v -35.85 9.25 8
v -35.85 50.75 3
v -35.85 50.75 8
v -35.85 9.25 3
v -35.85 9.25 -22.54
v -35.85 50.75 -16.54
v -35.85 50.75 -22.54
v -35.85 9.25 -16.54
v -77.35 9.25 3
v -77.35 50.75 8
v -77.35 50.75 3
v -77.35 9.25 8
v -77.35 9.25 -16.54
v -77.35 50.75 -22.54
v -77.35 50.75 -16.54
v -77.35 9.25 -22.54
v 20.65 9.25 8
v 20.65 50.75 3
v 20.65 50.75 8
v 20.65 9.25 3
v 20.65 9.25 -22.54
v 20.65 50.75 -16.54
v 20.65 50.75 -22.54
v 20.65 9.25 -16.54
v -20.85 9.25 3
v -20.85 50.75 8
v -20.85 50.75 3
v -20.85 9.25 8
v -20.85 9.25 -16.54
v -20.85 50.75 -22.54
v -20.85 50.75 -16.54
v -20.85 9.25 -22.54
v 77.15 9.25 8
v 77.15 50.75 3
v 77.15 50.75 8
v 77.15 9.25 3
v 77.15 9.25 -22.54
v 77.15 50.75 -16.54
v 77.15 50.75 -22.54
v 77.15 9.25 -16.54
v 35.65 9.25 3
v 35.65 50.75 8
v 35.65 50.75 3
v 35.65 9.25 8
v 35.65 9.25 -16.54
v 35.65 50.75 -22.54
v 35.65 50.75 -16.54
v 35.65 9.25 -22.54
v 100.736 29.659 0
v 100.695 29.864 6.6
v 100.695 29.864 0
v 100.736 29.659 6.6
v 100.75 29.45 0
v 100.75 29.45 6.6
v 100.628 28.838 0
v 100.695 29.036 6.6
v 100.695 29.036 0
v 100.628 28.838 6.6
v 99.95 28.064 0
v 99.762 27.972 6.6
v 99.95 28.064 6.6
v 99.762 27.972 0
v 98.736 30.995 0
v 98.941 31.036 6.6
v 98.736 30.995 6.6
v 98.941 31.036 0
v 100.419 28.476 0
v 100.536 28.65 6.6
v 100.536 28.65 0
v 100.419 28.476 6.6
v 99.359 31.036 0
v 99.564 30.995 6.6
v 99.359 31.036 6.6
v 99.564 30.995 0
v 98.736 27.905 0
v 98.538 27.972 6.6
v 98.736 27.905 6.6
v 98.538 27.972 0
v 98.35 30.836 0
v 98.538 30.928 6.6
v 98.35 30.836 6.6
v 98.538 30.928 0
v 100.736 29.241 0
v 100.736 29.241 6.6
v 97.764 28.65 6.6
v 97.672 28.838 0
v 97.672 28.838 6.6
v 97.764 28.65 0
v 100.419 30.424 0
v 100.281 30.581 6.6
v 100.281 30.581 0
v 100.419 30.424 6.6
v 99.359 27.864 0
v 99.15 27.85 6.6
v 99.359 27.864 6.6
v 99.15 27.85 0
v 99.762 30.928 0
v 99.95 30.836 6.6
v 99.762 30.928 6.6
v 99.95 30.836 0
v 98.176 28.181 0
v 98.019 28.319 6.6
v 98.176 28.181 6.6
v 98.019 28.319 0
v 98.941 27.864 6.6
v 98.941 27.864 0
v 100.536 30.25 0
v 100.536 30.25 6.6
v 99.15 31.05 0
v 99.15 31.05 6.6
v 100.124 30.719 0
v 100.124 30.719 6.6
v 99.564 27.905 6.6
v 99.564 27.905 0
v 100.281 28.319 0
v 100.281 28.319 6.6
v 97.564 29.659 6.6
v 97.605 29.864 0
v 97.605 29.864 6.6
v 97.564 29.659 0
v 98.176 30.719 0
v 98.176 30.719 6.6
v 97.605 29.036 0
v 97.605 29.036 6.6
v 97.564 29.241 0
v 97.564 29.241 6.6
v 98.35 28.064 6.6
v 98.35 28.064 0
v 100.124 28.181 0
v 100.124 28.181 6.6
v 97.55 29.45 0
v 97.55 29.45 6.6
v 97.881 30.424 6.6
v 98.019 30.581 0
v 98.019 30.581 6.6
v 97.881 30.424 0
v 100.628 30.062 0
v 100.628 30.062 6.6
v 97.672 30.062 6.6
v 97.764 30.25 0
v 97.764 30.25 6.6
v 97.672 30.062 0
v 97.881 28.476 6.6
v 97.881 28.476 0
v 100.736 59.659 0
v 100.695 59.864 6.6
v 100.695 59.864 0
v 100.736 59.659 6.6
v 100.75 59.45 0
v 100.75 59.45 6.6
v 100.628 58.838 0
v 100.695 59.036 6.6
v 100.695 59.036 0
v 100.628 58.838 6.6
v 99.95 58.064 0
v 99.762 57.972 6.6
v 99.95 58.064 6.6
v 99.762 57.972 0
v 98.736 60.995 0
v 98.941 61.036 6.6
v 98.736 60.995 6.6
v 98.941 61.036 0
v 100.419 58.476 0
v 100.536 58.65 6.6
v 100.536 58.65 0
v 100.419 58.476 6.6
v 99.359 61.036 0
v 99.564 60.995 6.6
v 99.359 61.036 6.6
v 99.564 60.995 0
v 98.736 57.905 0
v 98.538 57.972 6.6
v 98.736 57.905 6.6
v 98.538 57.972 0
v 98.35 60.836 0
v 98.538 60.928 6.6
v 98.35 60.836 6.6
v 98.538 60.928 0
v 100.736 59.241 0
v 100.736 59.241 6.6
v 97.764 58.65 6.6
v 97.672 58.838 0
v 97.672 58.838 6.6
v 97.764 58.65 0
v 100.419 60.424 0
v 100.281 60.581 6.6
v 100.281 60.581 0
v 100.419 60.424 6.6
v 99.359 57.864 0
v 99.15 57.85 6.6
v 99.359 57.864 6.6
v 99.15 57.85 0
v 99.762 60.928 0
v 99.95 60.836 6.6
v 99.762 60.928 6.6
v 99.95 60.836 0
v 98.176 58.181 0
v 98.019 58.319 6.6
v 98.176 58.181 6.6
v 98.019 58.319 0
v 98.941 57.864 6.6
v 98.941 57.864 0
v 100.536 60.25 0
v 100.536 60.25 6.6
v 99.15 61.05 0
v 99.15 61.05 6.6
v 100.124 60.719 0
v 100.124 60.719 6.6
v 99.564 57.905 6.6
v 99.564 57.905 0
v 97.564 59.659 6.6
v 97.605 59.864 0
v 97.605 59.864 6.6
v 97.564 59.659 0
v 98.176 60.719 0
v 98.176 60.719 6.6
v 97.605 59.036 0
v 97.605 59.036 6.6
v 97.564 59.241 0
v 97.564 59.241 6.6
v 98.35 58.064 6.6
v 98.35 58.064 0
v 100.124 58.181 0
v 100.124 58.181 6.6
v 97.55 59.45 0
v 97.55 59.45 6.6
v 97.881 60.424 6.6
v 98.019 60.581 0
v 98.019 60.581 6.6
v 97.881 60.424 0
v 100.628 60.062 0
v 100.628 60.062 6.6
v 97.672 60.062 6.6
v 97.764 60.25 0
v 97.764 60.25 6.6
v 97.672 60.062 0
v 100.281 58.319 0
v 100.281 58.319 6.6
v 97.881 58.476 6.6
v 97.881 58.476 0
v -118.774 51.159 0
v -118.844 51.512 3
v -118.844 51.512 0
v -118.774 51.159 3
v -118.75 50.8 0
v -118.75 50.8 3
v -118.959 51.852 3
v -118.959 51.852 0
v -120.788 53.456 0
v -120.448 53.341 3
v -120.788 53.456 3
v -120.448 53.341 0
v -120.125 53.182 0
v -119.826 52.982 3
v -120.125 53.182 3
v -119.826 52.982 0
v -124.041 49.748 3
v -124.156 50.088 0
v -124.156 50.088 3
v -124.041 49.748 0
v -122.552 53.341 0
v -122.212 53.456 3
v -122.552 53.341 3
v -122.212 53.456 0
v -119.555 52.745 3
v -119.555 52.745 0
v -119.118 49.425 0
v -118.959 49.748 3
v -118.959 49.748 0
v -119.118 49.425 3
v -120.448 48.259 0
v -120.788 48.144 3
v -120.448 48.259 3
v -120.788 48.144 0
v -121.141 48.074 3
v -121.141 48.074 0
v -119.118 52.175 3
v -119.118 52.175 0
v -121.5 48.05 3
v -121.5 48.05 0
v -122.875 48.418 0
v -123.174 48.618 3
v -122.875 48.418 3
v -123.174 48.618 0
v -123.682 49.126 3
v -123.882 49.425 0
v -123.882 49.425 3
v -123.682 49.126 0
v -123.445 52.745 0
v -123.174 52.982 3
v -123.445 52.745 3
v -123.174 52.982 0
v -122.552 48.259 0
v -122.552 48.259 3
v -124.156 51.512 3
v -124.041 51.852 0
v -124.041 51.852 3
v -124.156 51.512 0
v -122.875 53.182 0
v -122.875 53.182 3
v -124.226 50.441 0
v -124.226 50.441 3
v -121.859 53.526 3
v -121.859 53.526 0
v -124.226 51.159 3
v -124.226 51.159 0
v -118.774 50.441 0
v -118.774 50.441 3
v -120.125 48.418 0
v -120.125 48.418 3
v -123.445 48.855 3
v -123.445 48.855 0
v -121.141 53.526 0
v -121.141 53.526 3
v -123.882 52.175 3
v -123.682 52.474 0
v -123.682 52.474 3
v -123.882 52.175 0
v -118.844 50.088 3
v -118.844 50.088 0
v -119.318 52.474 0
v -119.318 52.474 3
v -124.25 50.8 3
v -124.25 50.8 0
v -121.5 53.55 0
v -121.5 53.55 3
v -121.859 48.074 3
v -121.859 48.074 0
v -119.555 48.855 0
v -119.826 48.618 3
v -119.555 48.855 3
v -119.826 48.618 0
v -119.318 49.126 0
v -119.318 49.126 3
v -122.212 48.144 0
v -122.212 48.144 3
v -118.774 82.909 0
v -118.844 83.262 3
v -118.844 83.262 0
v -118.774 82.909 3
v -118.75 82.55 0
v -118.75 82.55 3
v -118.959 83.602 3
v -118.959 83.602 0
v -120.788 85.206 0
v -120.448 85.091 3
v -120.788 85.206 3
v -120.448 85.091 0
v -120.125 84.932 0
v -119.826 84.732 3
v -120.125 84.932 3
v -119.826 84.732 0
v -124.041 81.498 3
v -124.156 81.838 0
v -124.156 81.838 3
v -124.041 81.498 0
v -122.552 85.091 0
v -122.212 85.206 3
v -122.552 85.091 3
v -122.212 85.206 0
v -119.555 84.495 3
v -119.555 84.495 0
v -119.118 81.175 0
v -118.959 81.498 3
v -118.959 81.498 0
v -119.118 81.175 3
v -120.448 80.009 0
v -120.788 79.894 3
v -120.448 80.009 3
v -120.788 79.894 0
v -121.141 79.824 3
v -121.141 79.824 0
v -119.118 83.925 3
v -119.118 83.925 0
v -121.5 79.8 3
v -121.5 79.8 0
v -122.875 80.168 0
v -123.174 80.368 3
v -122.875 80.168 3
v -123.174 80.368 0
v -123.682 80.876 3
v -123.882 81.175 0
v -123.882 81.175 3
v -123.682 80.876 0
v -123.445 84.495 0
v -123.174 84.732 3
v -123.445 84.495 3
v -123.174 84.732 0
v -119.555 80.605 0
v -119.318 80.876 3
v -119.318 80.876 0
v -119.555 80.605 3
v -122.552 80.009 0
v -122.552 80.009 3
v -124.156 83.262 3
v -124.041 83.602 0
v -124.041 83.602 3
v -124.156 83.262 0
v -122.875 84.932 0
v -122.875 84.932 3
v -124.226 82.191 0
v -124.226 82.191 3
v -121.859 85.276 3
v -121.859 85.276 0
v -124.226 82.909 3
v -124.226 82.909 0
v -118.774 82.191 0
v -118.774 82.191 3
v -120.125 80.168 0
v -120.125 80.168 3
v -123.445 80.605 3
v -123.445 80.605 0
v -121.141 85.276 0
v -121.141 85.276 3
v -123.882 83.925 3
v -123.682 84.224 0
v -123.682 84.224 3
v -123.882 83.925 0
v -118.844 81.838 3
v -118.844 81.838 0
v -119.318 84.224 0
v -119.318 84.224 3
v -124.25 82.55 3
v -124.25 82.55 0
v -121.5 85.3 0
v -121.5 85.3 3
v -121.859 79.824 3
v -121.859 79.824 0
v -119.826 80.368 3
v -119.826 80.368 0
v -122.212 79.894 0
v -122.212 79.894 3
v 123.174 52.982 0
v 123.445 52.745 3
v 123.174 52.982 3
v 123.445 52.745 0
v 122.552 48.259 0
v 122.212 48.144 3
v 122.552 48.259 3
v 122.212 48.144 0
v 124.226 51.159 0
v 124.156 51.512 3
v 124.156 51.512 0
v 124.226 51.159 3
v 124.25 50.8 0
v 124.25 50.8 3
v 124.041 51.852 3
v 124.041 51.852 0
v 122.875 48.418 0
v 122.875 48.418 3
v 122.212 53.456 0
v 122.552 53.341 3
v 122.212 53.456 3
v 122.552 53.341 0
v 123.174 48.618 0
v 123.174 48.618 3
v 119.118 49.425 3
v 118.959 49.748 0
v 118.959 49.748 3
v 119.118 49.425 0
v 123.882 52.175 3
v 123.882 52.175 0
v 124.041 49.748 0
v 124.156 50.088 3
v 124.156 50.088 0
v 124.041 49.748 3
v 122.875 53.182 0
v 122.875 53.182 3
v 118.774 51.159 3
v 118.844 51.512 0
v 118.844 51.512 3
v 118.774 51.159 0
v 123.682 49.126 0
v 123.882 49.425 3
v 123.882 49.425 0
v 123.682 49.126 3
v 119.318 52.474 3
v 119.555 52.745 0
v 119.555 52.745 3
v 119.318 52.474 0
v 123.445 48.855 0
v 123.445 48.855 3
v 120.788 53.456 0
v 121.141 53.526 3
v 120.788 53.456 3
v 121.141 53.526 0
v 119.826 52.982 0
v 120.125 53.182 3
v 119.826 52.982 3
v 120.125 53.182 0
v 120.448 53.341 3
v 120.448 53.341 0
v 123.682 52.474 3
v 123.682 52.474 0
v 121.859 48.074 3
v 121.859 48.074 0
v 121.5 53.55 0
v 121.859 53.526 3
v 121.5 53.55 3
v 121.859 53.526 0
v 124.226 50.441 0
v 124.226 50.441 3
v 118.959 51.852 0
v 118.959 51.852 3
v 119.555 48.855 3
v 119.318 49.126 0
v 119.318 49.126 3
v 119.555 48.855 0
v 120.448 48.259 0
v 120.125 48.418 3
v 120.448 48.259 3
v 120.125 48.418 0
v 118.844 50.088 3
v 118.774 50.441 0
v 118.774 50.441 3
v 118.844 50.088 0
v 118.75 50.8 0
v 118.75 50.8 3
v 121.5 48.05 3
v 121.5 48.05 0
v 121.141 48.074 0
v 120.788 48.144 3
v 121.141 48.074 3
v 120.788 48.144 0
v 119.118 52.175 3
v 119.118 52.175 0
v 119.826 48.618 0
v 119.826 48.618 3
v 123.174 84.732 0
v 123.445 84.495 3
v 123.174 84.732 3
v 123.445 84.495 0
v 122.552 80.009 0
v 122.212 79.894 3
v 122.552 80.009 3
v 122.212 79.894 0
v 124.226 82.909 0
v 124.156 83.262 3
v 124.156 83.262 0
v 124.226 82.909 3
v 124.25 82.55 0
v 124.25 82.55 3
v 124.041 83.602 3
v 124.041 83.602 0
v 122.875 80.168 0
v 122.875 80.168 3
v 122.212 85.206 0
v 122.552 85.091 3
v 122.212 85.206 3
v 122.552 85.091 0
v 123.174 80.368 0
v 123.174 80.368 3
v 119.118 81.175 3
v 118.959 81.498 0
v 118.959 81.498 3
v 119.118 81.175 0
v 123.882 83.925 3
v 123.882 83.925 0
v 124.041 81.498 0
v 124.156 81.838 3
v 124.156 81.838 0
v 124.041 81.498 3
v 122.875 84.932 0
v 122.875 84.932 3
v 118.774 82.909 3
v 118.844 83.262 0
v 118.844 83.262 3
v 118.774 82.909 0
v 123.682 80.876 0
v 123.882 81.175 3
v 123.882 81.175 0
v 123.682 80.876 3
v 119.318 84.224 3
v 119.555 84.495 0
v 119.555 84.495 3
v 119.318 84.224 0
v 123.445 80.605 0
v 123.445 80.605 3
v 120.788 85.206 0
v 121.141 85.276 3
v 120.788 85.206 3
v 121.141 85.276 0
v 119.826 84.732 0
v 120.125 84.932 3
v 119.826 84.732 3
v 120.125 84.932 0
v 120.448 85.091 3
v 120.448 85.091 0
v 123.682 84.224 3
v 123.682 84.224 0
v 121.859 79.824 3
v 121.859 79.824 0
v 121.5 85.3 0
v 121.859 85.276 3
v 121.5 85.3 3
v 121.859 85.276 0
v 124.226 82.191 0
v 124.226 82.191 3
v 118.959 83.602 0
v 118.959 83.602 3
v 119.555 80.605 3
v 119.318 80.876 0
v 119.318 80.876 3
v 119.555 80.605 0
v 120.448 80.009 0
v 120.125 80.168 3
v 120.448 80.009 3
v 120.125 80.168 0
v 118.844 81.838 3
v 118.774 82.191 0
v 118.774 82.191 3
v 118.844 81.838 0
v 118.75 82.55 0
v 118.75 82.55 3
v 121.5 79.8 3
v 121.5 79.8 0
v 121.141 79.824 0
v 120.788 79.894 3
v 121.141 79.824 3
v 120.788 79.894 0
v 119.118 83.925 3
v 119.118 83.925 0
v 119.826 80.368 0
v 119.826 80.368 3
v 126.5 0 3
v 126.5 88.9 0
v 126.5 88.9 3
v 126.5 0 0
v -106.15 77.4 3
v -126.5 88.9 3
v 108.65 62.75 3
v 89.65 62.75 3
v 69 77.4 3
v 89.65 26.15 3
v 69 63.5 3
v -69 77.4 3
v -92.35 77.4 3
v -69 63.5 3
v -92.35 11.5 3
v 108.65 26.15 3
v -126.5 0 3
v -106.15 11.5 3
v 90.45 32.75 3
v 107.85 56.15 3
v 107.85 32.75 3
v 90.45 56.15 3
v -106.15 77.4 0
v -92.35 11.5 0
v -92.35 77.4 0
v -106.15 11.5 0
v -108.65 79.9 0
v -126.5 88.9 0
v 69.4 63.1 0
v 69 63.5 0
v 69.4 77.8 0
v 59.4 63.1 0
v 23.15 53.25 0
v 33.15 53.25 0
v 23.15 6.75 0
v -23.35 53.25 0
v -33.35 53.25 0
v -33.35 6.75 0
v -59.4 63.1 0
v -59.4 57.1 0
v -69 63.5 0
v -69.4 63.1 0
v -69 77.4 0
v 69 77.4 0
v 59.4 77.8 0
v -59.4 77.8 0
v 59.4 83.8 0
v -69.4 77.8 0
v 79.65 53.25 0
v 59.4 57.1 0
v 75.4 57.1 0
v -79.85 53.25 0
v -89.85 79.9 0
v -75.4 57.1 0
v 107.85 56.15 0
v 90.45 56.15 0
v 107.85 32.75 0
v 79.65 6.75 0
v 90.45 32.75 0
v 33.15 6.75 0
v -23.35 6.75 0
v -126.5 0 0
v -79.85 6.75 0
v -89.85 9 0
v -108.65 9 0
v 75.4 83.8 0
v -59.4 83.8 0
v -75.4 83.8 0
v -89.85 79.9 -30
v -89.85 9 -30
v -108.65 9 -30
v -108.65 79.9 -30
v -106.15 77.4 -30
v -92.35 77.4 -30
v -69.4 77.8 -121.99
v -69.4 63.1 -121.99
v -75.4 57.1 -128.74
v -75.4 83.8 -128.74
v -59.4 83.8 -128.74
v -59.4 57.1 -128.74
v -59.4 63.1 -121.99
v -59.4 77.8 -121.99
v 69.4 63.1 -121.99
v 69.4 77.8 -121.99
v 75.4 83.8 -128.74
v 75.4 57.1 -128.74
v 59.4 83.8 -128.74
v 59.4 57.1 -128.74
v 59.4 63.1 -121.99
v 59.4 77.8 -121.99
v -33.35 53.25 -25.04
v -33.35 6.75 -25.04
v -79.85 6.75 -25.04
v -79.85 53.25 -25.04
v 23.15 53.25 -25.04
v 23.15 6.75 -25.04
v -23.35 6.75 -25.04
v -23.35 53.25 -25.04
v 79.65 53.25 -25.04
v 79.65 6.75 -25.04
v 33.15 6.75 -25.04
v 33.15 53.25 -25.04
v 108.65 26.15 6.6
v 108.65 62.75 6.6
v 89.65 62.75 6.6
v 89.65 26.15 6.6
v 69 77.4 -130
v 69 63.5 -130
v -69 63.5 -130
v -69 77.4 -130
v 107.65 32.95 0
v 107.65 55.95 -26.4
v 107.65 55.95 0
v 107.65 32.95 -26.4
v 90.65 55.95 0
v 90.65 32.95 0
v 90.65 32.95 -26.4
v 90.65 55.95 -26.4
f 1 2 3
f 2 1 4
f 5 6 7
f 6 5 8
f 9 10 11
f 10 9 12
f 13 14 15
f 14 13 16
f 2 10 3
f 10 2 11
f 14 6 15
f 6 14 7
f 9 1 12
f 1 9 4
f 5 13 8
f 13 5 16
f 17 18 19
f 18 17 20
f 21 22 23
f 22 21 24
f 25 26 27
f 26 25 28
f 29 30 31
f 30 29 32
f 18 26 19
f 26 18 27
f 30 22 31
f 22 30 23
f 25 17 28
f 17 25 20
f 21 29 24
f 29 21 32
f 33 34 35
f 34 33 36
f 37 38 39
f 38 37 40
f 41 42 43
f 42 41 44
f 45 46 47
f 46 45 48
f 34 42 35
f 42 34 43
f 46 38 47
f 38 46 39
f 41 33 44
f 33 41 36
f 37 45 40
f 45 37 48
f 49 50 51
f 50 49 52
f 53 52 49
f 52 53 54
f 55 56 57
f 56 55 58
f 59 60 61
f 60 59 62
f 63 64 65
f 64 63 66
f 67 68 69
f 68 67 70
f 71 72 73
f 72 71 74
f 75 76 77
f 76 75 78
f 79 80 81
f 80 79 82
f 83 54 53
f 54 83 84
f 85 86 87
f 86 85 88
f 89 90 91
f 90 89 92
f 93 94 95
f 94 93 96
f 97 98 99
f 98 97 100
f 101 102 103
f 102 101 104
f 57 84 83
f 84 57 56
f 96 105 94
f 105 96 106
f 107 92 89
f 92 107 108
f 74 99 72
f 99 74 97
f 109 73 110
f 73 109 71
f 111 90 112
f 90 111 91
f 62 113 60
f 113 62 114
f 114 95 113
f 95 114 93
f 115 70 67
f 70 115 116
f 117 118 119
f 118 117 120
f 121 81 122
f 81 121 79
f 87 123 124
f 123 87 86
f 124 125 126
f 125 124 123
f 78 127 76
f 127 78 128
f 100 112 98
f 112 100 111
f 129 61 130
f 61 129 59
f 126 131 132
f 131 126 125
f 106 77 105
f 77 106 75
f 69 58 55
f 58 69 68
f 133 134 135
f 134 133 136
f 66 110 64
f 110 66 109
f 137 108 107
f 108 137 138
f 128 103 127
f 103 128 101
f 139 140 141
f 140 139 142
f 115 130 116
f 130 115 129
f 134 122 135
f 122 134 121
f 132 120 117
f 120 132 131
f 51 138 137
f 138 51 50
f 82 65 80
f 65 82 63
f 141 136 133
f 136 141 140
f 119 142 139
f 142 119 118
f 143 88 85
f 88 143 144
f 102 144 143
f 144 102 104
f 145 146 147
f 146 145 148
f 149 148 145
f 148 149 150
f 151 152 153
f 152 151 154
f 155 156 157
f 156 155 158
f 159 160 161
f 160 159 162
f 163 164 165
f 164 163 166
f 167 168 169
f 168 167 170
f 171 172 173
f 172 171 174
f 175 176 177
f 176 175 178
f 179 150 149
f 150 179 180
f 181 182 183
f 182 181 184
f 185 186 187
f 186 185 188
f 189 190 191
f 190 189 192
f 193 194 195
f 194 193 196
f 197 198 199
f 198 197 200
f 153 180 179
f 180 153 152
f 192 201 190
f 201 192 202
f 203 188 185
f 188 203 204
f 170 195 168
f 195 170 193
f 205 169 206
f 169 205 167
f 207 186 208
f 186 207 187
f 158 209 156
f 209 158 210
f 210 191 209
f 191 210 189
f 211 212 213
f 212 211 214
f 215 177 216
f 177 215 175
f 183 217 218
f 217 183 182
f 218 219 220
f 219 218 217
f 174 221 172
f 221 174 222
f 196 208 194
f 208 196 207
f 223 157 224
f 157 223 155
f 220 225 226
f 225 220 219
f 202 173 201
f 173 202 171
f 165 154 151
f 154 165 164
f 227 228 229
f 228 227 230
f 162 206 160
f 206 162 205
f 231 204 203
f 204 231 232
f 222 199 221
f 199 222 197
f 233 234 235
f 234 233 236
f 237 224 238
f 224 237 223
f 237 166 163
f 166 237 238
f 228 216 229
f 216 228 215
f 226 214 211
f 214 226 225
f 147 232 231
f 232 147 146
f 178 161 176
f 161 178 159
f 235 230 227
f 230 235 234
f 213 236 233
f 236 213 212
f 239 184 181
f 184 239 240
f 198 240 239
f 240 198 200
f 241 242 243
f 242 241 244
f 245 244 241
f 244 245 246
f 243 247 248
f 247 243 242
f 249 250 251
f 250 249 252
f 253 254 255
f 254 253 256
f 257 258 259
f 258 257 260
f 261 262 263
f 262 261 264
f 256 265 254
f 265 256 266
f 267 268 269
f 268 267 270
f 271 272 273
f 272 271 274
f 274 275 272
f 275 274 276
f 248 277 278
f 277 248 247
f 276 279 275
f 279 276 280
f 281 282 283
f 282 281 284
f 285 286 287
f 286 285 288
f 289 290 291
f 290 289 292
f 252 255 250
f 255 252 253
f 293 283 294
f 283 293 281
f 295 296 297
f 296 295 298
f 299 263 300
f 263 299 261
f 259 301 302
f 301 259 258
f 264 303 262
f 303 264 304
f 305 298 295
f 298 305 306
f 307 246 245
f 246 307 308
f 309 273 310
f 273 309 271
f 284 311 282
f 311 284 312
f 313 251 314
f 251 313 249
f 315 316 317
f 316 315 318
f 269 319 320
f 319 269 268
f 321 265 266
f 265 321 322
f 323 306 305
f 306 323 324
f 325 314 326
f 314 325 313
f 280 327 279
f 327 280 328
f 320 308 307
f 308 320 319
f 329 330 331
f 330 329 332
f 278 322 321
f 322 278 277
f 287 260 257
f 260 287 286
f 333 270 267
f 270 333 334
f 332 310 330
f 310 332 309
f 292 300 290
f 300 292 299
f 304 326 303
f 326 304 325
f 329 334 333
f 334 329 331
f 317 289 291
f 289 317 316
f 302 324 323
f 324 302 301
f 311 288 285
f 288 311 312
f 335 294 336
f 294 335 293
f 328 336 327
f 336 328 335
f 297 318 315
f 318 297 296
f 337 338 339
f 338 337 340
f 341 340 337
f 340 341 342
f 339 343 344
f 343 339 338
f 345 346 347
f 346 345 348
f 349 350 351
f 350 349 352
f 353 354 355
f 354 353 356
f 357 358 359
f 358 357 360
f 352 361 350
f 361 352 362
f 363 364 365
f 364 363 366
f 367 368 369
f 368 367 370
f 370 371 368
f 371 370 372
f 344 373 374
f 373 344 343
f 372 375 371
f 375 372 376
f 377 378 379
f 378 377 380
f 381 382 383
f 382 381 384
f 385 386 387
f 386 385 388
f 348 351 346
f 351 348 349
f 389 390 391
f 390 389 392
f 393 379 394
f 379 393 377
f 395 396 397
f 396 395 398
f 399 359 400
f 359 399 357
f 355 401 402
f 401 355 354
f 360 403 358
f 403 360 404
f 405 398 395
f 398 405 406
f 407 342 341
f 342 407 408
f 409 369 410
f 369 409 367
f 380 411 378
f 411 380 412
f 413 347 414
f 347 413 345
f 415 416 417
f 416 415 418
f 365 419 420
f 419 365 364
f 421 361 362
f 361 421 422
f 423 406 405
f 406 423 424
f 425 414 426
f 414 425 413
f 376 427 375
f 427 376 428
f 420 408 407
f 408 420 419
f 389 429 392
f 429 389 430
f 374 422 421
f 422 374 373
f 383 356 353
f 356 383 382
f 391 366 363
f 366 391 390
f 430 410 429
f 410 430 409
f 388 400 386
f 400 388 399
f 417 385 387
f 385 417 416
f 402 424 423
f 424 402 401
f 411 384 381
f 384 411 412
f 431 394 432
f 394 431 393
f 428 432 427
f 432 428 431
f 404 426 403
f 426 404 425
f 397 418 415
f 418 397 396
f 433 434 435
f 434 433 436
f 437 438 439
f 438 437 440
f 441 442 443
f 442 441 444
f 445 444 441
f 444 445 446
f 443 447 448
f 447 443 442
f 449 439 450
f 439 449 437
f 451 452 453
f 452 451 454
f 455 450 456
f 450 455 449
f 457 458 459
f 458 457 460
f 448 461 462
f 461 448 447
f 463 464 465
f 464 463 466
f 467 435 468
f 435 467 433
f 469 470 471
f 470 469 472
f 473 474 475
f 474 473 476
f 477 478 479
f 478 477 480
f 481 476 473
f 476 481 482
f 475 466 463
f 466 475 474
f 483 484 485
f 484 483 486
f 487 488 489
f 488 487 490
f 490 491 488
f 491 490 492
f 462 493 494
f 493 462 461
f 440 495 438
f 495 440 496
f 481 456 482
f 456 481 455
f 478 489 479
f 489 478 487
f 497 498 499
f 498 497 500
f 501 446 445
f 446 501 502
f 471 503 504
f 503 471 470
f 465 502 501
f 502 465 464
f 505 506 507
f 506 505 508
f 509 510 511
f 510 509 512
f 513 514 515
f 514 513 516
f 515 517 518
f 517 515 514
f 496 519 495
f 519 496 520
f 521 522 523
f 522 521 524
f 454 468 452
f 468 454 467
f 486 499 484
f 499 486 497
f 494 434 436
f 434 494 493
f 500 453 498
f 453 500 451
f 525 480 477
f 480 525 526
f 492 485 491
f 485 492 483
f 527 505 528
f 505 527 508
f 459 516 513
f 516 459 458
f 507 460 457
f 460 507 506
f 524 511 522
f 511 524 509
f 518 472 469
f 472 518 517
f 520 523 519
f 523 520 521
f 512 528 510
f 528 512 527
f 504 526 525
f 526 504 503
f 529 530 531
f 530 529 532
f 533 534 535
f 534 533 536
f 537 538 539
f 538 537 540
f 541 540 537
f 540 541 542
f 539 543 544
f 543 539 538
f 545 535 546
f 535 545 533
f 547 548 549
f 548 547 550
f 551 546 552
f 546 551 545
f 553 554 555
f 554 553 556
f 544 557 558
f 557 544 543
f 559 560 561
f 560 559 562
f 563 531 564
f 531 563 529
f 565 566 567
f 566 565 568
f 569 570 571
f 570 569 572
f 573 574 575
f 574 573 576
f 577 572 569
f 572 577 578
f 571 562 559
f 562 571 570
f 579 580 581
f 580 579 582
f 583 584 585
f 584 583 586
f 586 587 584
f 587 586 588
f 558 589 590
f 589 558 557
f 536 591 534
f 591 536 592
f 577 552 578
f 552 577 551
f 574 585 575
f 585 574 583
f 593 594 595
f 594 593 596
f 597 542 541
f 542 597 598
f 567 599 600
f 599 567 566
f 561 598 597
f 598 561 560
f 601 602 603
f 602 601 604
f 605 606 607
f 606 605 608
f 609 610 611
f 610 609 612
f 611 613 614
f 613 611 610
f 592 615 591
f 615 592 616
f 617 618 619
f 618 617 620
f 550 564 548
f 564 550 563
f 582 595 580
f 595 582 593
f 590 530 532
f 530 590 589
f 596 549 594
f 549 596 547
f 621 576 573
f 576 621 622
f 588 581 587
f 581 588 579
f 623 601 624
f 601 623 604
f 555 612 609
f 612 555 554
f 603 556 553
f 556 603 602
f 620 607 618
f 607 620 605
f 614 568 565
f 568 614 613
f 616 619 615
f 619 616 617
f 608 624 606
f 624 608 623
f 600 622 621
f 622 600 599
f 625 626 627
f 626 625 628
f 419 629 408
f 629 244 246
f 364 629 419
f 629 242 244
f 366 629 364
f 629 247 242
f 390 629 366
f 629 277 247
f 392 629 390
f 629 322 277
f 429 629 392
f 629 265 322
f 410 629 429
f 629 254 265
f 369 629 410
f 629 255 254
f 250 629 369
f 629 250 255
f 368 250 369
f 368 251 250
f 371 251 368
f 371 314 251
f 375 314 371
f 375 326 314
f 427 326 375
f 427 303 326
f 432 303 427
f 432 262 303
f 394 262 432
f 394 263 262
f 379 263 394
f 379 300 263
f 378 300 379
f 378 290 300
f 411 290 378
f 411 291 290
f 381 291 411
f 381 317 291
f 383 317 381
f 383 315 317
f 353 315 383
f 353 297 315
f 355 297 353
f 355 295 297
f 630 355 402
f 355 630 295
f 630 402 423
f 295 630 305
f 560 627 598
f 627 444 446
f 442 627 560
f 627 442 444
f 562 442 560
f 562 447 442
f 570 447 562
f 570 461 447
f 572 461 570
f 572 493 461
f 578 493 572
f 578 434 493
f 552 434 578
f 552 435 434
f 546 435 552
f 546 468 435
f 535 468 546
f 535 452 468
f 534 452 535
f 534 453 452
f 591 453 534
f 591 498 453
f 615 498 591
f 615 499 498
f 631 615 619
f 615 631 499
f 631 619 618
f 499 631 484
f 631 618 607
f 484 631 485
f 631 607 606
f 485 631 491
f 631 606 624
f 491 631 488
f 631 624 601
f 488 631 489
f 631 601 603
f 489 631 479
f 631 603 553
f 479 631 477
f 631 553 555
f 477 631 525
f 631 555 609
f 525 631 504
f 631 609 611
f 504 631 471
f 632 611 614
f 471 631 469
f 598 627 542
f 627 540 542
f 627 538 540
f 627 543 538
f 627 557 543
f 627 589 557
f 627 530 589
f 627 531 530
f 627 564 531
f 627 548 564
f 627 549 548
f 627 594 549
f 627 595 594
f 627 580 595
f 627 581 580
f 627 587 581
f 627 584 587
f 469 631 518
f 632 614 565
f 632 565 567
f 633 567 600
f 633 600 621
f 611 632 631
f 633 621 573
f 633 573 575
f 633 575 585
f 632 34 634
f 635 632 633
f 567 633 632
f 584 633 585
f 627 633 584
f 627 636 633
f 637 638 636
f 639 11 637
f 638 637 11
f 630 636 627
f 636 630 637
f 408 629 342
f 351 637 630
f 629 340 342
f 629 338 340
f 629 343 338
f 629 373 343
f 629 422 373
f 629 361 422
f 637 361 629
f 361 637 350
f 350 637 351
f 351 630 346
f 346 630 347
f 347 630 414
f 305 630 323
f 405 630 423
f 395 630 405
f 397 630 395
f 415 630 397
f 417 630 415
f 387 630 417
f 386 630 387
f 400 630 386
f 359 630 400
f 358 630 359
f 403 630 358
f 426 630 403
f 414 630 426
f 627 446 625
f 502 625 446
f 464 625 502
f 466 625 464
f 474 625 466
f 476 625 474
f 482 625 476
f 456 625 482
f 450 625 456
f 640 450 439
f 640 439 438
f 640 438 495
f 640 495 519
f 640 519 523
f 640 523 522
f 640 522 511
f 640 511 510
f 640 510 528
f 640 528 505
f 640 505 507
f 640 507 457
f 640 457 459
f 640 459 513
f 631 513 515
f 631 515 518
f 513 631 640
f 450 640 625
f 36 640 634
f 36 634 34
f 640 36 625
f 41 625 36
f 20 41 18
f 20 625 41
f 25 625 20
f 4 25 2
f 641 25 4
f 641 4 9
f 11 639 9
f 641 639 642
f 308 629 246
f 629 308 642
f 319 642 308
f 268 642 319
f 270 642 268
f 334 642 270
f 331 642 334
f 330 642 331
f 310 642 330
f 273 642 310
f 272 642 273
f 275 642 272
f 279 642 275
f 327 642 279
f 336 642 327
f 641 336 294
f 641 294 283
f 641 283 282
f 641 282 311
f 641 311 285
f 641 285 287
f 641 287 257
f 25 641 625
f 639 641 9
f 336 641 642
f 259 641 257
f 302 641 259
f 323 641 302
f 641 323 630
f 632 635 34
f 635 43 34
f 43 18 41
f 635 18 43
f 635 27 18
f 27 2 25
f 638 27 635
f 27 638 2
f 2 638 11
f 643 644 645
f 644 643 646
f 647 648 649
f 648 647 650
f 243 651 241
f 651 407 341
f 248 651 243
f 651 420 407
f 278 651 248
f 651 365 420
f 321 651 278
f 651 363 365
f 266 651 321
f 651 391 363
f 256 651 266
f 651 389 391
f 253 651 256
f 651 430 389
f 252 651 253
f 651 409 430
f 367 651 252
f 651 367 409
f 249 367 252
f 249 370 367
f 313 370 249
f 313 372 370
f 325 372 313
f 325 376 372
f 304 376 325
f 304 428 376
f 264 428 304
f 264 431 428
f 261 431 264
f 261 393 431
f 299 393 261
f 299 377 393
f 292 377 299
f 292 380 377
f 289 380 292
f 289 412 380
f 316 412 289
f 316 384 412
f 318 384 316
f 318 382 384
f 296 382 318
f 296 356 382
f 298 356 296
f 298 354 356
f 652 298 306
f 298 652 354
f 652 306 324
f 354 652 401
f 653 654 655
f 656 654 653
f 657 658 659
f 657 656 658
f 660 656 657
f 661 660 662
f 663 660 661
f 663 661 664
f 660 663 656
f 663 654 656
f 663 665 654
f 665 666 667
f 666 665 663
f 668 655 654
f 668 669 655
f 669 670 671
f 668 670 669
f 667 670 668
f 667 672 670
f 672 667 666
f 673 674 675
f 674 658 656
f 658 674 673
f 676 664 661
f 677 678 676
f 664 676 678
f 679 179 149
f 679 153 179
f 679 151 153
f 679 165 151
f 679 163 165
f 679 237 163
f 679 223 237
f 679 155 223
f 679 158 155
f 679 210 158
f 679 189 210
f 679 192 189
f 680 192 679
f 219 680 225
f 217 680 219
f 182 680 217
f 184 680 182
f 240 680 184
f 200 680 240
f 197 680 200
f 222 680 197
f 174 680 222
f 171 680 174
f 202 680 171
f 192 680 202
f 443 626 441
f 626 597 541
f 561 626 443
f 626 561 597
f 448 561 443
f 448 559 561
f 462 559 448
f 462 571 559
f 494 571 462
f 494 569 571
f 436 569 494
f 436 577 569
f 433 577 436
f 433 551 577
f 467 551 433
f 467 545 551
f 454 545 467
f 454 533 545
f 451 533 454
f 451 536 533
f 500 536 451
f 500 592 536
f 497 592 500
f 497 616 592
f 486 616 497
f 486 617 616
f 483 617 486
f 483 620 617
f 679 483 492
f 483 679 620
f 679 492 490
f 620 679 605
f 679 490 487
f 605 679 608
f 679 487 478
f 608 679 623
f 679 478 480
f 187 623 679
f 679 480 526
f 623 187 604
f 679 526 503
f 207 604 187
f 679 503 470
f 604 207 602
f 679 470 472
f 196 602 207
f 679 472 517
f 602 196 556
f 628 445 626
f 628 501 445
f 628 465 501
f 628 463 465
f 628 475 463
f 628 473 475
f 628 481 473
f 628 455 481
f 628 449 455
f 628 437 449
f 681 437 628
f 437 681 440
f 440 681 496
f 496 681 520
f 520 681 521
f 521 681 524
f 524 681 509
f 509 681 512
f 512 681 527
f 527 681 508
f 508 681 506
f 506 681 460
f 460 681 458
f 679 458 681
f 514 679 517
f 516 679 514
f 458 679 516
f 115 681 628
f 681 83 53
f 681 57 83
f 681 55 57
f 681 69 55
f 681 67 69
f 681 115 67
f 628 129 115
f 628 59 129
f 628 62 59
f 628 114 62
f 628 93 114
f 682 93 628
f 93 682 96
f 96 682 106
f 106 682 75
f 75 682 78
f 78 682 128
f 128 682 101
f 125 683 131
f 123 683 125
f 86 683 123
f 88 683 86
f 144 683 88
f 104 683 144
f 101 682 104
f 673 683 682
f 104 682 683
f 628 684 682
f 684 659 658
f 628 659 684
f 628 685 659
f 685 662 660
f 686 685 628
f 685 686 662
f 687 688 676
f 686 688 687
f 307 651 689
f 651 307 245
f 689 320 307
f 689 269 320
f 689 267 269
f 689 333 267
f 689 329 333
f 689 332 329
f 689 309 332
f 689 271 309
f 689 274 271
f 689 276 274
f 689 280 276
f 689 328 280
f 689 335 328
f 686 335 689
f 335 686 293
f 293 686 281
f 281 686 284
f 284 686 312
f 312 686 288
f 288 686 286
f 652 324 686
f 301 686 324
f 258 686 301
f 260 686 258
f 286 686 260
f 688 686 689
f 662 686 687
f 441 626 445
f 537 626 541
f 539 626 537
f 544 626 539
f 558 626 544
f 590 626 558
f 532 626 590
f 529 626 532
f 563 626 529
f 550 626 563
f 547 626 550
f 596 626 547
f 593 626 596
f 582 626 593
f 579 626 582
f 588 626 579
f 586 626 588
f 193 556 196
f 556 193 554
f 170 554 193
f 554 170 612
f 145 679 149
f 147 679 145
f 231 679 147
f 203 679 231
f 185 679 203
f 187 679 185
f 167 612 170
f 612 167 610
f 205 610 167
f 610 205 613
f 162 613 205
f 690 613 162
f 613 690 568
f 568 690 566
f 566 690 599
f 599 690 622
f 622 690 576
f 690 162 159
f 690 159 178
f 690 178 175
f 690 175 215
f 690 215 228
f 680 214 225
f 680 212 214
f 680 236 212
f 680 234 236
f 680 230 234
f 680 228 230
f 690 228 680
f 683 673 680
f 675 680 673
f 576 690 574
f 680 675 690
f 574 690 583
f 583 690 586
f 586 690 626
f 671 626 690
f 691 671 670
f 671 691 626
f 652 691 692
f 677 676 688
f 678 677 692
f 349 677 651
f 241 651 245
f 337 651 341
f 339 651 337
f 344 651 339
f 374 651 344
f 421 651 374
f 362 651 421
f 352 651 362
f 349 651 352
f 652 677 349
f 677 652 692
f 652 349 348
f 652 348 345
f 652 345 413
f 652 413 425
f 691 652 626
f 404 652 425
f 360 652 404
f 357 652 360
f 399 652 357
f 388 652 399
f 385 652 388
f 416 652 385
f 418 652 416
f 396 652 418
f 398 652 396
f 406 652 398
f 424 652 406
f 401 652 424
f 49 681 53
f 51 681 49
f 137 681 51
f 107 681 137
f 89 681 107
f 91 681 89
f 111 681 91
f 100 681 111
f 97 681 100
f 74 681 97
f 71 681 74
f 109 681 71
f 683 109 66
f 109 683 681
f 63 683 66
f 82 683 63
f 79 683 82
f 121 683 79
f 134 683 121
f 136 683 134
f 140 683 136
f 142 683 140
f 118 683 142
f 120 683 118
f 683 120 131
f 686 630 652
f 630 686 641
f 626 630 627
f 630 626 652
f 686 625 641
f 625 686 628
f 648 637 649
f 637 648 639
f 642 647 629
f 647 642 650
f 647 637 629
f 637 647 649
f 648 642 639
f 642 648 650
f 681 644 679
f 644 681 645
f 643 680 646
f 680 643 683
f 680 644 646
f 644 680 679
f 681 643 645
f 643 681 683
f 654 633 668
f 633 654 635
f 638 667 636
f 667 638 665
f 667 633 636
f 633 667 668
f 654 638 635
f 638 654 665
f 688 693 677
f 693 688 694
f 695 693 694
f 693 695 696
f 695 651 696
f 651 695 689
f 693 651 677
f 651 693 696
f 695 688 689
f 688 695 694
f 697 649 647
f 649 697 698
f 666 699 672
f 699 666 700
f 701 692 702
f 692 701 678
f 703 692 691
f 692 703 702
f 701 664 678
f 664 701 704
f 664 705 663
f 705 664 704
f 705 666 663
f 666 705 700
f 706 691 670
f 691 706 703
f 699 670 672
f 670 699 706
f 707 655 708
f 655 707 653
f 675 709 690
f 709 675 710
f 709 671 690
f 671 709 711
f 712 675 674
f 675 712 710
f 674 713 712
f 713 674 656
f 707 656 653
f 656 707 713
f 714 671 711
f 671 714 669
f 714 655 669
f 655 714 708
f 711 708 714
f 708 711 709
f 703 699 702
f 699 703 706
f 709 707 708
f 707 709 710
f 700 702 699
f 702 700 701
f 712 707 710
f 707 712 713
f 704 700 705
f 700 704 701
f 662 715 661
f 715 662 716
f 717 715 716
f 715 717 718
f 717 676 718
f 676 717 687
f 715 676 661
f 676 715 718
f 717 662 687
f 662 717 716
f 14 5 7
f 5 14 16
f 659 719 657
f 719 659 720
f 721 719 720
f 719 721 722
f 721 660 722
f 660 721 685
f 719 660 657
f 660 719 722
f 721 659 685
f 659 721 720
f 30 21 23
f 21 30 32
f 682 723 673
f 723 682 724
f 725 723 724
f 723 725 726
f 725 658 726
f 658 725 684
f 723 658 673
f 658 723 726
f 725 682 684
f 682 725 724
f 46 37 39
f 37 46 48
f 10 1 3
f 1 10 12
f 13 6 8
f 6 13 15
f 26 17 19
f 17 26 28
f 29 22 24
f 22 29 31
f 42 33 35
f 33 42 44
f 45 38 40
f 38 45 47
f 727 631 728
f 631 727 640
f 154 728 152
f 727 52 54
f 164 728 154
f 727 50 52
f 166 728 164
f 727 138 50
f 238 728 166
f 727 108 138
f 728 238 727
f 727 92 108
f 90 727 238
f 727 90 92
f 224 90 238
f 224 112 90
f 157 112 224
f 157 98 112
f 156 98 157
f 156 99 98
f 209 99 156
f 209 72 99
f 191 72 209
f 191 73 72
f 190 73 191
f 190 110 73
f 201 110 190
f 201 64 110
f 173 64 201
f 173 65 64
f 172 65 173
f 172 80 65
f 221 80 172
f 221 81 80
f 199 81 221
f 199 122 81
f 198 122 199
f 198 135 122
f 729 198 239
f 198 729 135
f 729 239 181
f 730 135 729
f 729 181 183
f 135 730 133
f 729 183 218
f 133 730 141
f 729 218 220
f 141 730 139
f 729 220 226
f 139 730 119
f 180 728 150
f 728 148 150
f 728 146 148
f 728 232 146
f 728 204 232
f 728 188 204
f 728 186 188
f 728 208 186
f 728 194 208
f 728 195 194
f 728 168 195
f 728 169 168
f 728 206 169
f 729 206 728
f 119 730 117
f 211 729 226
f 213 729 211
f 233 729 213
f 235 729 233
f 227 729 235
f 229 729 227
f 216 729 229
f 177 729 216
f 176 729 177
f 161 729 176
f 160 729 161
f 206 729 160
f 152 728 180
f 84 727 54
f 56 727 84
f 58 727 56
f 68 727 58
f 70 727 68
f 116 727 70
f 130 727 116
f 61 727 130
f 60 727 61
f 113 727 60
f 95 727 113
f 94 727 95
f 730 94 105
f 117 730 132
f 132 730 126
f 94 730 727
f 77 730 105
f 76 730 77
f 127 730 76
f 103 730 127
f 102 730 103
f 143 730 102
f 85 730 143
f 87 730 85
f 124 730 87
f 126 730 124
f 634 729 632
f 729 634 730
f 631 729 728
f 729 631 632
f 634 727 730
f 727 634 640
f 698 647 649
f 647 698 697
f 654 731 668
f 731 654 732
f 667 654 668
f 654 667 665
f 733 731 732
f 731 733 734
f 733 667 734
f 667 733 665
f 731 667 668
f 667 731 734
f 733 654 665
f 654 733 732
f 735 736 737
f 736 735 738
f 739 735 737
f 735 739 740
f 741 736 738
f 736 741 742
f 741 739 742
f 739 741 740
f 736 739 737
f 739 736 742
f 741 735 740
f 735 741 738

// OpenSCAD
// =============================================================================
// CONSOLE10 — Blu-ray Faceplate  v0.5  (2U TOP: CF + Blu-ray + 3 SD + USB-C)
//
// Regular 2U flat 3 mm faceplate that bolts to the cheek SLANT inserts.
// Hosts: CF reader (left), a slot-load Blu-ray drive (center, with side rails
// reaching back), the 3 SD-card holders relocated UNDER the Blu-ray slot, and a
// USB-C panel mount (right). (2026-06-02 edits.)
//
// Split off from the 3U LCD-hole faceplate on 2026-05-30. See
// `Console10_interface_specs.md` for the canonical device dimensions.
// =============================================================================

// ---------- module geometry the plate must mate to ----------
panel_width   = 253;
cheek_thick   = 10;
slant_angle   = 30;
U             = 44.45;
interior_half = panel_width/2 - cheek_thick;   // 116.5
cheek_ctr_x   = interior_half + cheek_thick/2; // 121.5

// ---------- flat plate ----------
n_u      = 2;             // 2U faceplate (top panel)
plate_w  = 253;
plate_h  = n_u * U;       // 88.9
plate_t  = 3;

// ---------- CF reader (press-fit, full-depth open sleeve) ----------
cf_w         = 13.8;
cf_h         = 65.9;
cf_d         = 30;
cf_press_clr = 0;
cf_wall_t    = 2.5;
cf_cx        = -99.25;     // shifted left so 3 holders + USB-C fit symmetrically
cf_cy        = plate_h/2;

// ---------- SD card holder (press-fit, closed-back sleeve, sits proud) ----
holder_w         = 41.5;
holder_h         = 41.5;
holder_d         = 24.54;
holder_press_clr = 0;
holder_wall_t    = 2.5;
holder_proud     = 5;
holder_sleeve_extra_d = 6;
holder_sleeve_d  = (holder_d - plate_t - holder_proud) + holder_wall_t + holder_sleeve_extra_d;

// ---------- USB-C panel mount (QIANRENON rectangular, screw-mounted, proud) ----
usbc_body_w         = 17;
usbc_body_h         = 23;
usbc_body_d         = 26.4;
usbc_flange_w       = 19;
usbc_flange_h       = 36.6;
usbc_flange_t       = 3.6;
usbc_screw_d        = 3.2;
usbc_screw_y_pitch  = 30;
usbc_body_clr       = 0.2;

// ---------- horizontal layout ----------
// Devices left-to-right: CF, holder1, holder2, holder3, USB-C. 3 holders
// grouped consecutively; USB-C anchors the far right. Each device's outer
// footprint separated from the next by panel_layout_gap. Layout symmetric
// around X=0 (cf_cx chosen to balance).
panel_layout_gap = 10;
holder_cy = 30;   // lowered UNDER the Blu-ray drive, clear of its side rails (was plate_h/2)

// Half-widths used in chain math
_cf_half     = (cf_w - 2*cf_press_clr)/2 + cf_wall_t;            //  9.4
_holder_half = (holder_w - 2*holder_press_clr)/2 + holder_wall_t; // 23.25

holder1_cx = cf_cx + _cf_half + panel_layout_gap + _holder_half;
holder2_cx = holder1_cx + 2*_holder_half + panel_layout_gap;
holder3_cx = holder2_cx + 2*_holder_half + panel_layout_gap;
usbc_cx    = holder3_cx + _holder_half + panel_layout_gap + usbc_flange_w/2;
usbc_cy    = plate_h/2;

// All holder X centers (loop over this in panel/mocks)
holder_cxs = [holder1_cx, holder2_cx, holder3_cx];

// ---------- slant-insert mount holes ----------
// 2U plate spans s=0..88.9; only the U0 cheek-rail row fits: 50.80, 66.675, 82.55.
// Use the wide pair (50.80, 82.55) = 31.75 mm vertical grip. (s=22.225 is inside
// the front gap and has NO hole.)
mount_y      = [50.80, 82.55];
m10_32_clear = 5.5;

// ---------- Blu-ray disc slot (added 2026-06-02) ----------
// Slot-loading Blu-ray drive. This opening is the disc slot; TOP edge aligned
// with the top of the CF (media) reader slot. Centered on the plate in X (no X
// spec was given).
slot_w   = 138;
slot_h   = 13.9;
slot_d   = 100;                   // also the support-rail length back behind the face
slot_cx  = 0;
slot_top = cf_cy + cf_h/2;        // top of the CF reader slot = 77.4
slot_cy  = slot_top - slot_h/2;   // 70.45

// ---------- Blu-ray support rails (added 2026-06-02) ----------
// SIDE rails that wrap the drive's LEFT & RIGHT edges — a C-channel per side
// (side wall + top & bottom lips), full bd_rail_len deep down the side; the
// lips encroach only bd_wrap in from each side. No tray/floor; middle open.
// Defaults to the slot footprint — SET bd_body_w/h to the measured drive body.
bd_body_w   = slot_w;             // drive body width  (TODO: measure the drive)
bd_body_h   = slot_h;             // drive body height (TODO: measure the drive)
bd_body_d   = 130;                // drive full depth
bd_rail_len = bd_body_d;          // side rails run the full drive depth
bd_wrap     = 10;                 // lip encroachment in from each side
bd_rail_t   = 6;                  // side-wall / lip thickness (doubled from 3)
bd_lead     = 8;                  // lead-in chamfer length at the back mouth
bd_clr      = 0.4;                // slide clearance per side

show_on_slant = false;
show_devices  = true;
floor_t       = 6;

$fn = 48;

echo(str("BLU-RAY FACEPLATE v0.5 (2U TOP: CF + Blu-ray + 3 SD + USB-C) ", plate_w, " x ", plate_h, " (", n_u, "U) t", plate_t,
         " | CF @ x=", cf_cx,
         " | 3 SD @ y=", holder_cy, " x=", holder_cxs,
         " | USB-C @ x=", usbc_cx, " (cutout ", usbc_body_w + 2*usbc_body_clr, "x", usbc_body_h + 2*usbc_body_clr,
         ", screws Φ", usbc_screw_d, " @ y±", usbc_screw_y_pitch/2, ")",
         " | BLU-RAY SLOT ", slot_w, "x", slot_h, " @ x=", slot_cx, " top y=", slot_top,
         " + side rails wrap ", bd_wrap, " in, ", bd_rail_len, " deep, ", bd_lead, " lead-in"));

// =============================================================================
// CF SUPPORT SLEEVE — open both ends, wraps the CF reader full depth.
// =============================================================================
module cf_support_sleeve() {
    inner_w  = cf_w - 2*cf_press_clr;
    inner_h  = cf_h - 2*cf_press_clr;
    outer_w  = inner_w + 2*cf_wall_t;
    outer_h  = inner_h + 2*cf_wall_t;
    translate([cf_cx, cf_cy, -cf_d/2])
        difference() {
            cube([outer_w, outer_h, cf_d],     center = true);
            cube([inner_w, inner_h, cf_d + 2], center = true);
        }
}

// =============================================================================
// HOLDER SUPPORT SLEEVE — closed back (floor is the bottom-out stop).
// Takes a cx parameter so multiple holders can share the same module.
// =============================================================================
module holder_support_sleeve(cx) {
    inner_w   = holder_w - 2*holder_press_clr;
    inner_h   = holder_h - 2*holder_press_clr;
    outer_w   = inner_w + 2*holder_wall_t;
    outer_h   = inner_h + 2*holder_wall_t;
    cavity_d  = holder_sleeve_d - holder_wall_t;

    difference() {
        translate([cx - outer_w/2, holder_cy - outer_h/2, -holder_sleeve_d])
            cube([outer_w, outer_h, holder_sleeve_d]);
        translate([cx - inner_w/2, holder_cy - inner_h/2, -cavity_d])
            cube([inner_w, inner_h, cavity_d + 1]);
    }
}

// =============================================================================
// BLU-RAY SUPPORT RAILS — a C-channel down each SIDE that wraps the drive's
// left & right edges (side wall + top & bottom lips), full bd_rail_len deep.
// The lips reach bd_wrap in from each side; the middle is open.
// =============================================================================
module bluray_support_rails() {
    x_in     = bd_body_w/2 + bd_clr;            // drive side face (+ clearance)
    bottom_y = slot_cy - slot_h/2 - bd_clr;     // under the drive's bottom edge
    top_y    = slot_cy + slot_h/2 + bd_clr;     // over the drive's top edge
    module rail_L() {                            // left side rail; mirrored for right
        // side wall, outside the drive, spanning below the bottom lip to above the top lip
        translate([-x_in - bd_rail_t, bottom_y - bd_rail_t, -bd_rail_len])
            cube([bd_rail_t, (top_y - bottom_y) + 2*bd_rail_t, bd_rail_len]);
        // bottom lip — under the drive, encroaching bd_wrap in
        translate([-x_in, bottom_y - bd_rail_t, -bd_rail_len])
            cube([bd_wrap, bd_rail_t, bd_rail_len]);
        // top lip — over the drive, encroaching bd_wrap in
        translate([-x_in, top_y, -bd_rail_len])
            cube([bd_wrap, bd_rail_t, bd_rail_len]);
    }
    // lead-in funnel: flares the channel mouth (lip faces + side-wall inner) over
    // bd_lead at the back so the drive's edges feed into the rails.
    cy = (bottom_y + top_y) / 2;
    ch = top_y - bottom_y;
    cw = 2 * x_in;
    difference() {
        union() { rail_L(); mirror([1, 0, 0]) rail_L(); }
        hull() {
            translate([0, cy, -bd_rail_len + bd_lead]) cube([cw, ch, 0.02], center = true);
            translate([0, cy, -bd_rail_len - 1])       cube([cw + 2*bd_lead, ch + 2*bd_lead, 0.02], center = true);
        }
    }
}

// =============================================================================
// PANEL — flat 2U 3 mm slab + cutouts + rear sleeves.
// =============================================================================
module panel() {
    union() {
        difference() {
            translate([-plate_w/2, 0, 0]) cube([plate_w, plate_h, plate_t]);

            // CF reader press-fit cutout
            translate([cf_cx, cf_cy, plate_t/2])
                cube([cf_w - 2*cf_press_clr, cf_h - 2*cf_press_clr, plate_t + 2], center = true);

            // 3 SD card holder press-fit cutouts (under the Blu-ray drive)
            for (cx = holder_cxs)
                translate([cx, holder_cy, plate_t/2])
                    cube([holder_w - 2*holder_press_clr, holder_h - 2*holder_press_clr, plate_t + 2], center = true);

            // USB-C panel-mount: body cutout + 2 M3 screw holes
            translate([usbc_cx, usbc_cy, plate_t/2])
                cube([usbc_body_w + 2*usbc_body_clr, usbc_body_h + 2*usbc_body_clr, plate_t + 2], center = true);
            for (dy = [-1, 1])
                translate([usbc_cx, usbc_cy + dy*usbc_screw_y_pitch/2, -1])
                    cylinder(d = usbc_screw_d, h = plate_t + 2);

            // Wide top slot — 138 x 13.9, top edge aligned with the CF slot top,
            // cut slot_d deep (through the plate + rear clearance).
            translate([slot_cx, slot_cy, plate_t - slot_d/2])
                cube([slot_w, slot_h, slot_d + 2], center = true);

            // Slant-insert mount screws — 2 per side
            for (sx = [-cheek_ctr_x, cheek_ctr_x])
                for (y = mount_y)
                    translate([sx, y, -1]) cylinder(d = m10_32_clear, h = plate_t + 2);
        }

        cf_support_sleeve();
        bluray_support_rails();
        for (cx = holder_cxs) holder_support_sleeve(cx);
    }
}

// =============================================================================
// MOCKS — fit-check only.
// =============================================================================
module device_mocks() {
    color("SlateGray")
        translate([cf_cx, cf_cy, -cf_d/2])
            cube([cf_w, cf_h, cf_d], center = true);

    // 3 SD card holders (under the Blu-ray drive)
    for (cx = holder_cxs)
        color("Goldenrod")
            translate([cx, holder_cy, plate_t + holder_proud - holder_d/2])
                cube([holder_w, holder_h, holder_d], center = true);

    // Blu-ray drive body (slim slot-load) — fit-check mock, cradled in the rails
    color("DimGray")
        translate([slot_cx, (slot_cy - slot_h/2) + bd_body_h/2, -bd_rail_len/2])
            cube([bd_body_w, bd_body_h, bd_rail_len], center = true);

    color("Silver")
        difference() {
            translate([usbc_cx, usbc_cy, plate_t + usbc_flange_t/2])
                cube([usbc_flange_w, usbc_flange_h, usbc_flange_t], center = true);
            for (dy = [-1, 1])
                translate([usbc_cx, usbc_cy + dy*usbc_screw_y_pitch/2, plate_t - 1])
                    cylinder(d = usbc_screw_d, h = usbc_flange_t + 2);
        }
    color("DimGray")
        translate([usbc_cx, usbc_cy, -usbc_body_d/2])
            cube([usbc_body_w, usbc_body_h, usbc_body_d], center = true);
}

module aux_stack() {
    color("Gainsboro") panel();
    if (show_devices) device_mocks();
}

module aux_on_slant() {
    translate([0, 0, floor_t])
        rotate([90 - slant_angle, 0, 0])
            aux_stack();
}

// Public entry the module assembly calls:
module aux_2u_faceplate_on_slant() { aux_on_slant(); }

if (show_on_slant) aux_on_slant();
else               aux_stack();
